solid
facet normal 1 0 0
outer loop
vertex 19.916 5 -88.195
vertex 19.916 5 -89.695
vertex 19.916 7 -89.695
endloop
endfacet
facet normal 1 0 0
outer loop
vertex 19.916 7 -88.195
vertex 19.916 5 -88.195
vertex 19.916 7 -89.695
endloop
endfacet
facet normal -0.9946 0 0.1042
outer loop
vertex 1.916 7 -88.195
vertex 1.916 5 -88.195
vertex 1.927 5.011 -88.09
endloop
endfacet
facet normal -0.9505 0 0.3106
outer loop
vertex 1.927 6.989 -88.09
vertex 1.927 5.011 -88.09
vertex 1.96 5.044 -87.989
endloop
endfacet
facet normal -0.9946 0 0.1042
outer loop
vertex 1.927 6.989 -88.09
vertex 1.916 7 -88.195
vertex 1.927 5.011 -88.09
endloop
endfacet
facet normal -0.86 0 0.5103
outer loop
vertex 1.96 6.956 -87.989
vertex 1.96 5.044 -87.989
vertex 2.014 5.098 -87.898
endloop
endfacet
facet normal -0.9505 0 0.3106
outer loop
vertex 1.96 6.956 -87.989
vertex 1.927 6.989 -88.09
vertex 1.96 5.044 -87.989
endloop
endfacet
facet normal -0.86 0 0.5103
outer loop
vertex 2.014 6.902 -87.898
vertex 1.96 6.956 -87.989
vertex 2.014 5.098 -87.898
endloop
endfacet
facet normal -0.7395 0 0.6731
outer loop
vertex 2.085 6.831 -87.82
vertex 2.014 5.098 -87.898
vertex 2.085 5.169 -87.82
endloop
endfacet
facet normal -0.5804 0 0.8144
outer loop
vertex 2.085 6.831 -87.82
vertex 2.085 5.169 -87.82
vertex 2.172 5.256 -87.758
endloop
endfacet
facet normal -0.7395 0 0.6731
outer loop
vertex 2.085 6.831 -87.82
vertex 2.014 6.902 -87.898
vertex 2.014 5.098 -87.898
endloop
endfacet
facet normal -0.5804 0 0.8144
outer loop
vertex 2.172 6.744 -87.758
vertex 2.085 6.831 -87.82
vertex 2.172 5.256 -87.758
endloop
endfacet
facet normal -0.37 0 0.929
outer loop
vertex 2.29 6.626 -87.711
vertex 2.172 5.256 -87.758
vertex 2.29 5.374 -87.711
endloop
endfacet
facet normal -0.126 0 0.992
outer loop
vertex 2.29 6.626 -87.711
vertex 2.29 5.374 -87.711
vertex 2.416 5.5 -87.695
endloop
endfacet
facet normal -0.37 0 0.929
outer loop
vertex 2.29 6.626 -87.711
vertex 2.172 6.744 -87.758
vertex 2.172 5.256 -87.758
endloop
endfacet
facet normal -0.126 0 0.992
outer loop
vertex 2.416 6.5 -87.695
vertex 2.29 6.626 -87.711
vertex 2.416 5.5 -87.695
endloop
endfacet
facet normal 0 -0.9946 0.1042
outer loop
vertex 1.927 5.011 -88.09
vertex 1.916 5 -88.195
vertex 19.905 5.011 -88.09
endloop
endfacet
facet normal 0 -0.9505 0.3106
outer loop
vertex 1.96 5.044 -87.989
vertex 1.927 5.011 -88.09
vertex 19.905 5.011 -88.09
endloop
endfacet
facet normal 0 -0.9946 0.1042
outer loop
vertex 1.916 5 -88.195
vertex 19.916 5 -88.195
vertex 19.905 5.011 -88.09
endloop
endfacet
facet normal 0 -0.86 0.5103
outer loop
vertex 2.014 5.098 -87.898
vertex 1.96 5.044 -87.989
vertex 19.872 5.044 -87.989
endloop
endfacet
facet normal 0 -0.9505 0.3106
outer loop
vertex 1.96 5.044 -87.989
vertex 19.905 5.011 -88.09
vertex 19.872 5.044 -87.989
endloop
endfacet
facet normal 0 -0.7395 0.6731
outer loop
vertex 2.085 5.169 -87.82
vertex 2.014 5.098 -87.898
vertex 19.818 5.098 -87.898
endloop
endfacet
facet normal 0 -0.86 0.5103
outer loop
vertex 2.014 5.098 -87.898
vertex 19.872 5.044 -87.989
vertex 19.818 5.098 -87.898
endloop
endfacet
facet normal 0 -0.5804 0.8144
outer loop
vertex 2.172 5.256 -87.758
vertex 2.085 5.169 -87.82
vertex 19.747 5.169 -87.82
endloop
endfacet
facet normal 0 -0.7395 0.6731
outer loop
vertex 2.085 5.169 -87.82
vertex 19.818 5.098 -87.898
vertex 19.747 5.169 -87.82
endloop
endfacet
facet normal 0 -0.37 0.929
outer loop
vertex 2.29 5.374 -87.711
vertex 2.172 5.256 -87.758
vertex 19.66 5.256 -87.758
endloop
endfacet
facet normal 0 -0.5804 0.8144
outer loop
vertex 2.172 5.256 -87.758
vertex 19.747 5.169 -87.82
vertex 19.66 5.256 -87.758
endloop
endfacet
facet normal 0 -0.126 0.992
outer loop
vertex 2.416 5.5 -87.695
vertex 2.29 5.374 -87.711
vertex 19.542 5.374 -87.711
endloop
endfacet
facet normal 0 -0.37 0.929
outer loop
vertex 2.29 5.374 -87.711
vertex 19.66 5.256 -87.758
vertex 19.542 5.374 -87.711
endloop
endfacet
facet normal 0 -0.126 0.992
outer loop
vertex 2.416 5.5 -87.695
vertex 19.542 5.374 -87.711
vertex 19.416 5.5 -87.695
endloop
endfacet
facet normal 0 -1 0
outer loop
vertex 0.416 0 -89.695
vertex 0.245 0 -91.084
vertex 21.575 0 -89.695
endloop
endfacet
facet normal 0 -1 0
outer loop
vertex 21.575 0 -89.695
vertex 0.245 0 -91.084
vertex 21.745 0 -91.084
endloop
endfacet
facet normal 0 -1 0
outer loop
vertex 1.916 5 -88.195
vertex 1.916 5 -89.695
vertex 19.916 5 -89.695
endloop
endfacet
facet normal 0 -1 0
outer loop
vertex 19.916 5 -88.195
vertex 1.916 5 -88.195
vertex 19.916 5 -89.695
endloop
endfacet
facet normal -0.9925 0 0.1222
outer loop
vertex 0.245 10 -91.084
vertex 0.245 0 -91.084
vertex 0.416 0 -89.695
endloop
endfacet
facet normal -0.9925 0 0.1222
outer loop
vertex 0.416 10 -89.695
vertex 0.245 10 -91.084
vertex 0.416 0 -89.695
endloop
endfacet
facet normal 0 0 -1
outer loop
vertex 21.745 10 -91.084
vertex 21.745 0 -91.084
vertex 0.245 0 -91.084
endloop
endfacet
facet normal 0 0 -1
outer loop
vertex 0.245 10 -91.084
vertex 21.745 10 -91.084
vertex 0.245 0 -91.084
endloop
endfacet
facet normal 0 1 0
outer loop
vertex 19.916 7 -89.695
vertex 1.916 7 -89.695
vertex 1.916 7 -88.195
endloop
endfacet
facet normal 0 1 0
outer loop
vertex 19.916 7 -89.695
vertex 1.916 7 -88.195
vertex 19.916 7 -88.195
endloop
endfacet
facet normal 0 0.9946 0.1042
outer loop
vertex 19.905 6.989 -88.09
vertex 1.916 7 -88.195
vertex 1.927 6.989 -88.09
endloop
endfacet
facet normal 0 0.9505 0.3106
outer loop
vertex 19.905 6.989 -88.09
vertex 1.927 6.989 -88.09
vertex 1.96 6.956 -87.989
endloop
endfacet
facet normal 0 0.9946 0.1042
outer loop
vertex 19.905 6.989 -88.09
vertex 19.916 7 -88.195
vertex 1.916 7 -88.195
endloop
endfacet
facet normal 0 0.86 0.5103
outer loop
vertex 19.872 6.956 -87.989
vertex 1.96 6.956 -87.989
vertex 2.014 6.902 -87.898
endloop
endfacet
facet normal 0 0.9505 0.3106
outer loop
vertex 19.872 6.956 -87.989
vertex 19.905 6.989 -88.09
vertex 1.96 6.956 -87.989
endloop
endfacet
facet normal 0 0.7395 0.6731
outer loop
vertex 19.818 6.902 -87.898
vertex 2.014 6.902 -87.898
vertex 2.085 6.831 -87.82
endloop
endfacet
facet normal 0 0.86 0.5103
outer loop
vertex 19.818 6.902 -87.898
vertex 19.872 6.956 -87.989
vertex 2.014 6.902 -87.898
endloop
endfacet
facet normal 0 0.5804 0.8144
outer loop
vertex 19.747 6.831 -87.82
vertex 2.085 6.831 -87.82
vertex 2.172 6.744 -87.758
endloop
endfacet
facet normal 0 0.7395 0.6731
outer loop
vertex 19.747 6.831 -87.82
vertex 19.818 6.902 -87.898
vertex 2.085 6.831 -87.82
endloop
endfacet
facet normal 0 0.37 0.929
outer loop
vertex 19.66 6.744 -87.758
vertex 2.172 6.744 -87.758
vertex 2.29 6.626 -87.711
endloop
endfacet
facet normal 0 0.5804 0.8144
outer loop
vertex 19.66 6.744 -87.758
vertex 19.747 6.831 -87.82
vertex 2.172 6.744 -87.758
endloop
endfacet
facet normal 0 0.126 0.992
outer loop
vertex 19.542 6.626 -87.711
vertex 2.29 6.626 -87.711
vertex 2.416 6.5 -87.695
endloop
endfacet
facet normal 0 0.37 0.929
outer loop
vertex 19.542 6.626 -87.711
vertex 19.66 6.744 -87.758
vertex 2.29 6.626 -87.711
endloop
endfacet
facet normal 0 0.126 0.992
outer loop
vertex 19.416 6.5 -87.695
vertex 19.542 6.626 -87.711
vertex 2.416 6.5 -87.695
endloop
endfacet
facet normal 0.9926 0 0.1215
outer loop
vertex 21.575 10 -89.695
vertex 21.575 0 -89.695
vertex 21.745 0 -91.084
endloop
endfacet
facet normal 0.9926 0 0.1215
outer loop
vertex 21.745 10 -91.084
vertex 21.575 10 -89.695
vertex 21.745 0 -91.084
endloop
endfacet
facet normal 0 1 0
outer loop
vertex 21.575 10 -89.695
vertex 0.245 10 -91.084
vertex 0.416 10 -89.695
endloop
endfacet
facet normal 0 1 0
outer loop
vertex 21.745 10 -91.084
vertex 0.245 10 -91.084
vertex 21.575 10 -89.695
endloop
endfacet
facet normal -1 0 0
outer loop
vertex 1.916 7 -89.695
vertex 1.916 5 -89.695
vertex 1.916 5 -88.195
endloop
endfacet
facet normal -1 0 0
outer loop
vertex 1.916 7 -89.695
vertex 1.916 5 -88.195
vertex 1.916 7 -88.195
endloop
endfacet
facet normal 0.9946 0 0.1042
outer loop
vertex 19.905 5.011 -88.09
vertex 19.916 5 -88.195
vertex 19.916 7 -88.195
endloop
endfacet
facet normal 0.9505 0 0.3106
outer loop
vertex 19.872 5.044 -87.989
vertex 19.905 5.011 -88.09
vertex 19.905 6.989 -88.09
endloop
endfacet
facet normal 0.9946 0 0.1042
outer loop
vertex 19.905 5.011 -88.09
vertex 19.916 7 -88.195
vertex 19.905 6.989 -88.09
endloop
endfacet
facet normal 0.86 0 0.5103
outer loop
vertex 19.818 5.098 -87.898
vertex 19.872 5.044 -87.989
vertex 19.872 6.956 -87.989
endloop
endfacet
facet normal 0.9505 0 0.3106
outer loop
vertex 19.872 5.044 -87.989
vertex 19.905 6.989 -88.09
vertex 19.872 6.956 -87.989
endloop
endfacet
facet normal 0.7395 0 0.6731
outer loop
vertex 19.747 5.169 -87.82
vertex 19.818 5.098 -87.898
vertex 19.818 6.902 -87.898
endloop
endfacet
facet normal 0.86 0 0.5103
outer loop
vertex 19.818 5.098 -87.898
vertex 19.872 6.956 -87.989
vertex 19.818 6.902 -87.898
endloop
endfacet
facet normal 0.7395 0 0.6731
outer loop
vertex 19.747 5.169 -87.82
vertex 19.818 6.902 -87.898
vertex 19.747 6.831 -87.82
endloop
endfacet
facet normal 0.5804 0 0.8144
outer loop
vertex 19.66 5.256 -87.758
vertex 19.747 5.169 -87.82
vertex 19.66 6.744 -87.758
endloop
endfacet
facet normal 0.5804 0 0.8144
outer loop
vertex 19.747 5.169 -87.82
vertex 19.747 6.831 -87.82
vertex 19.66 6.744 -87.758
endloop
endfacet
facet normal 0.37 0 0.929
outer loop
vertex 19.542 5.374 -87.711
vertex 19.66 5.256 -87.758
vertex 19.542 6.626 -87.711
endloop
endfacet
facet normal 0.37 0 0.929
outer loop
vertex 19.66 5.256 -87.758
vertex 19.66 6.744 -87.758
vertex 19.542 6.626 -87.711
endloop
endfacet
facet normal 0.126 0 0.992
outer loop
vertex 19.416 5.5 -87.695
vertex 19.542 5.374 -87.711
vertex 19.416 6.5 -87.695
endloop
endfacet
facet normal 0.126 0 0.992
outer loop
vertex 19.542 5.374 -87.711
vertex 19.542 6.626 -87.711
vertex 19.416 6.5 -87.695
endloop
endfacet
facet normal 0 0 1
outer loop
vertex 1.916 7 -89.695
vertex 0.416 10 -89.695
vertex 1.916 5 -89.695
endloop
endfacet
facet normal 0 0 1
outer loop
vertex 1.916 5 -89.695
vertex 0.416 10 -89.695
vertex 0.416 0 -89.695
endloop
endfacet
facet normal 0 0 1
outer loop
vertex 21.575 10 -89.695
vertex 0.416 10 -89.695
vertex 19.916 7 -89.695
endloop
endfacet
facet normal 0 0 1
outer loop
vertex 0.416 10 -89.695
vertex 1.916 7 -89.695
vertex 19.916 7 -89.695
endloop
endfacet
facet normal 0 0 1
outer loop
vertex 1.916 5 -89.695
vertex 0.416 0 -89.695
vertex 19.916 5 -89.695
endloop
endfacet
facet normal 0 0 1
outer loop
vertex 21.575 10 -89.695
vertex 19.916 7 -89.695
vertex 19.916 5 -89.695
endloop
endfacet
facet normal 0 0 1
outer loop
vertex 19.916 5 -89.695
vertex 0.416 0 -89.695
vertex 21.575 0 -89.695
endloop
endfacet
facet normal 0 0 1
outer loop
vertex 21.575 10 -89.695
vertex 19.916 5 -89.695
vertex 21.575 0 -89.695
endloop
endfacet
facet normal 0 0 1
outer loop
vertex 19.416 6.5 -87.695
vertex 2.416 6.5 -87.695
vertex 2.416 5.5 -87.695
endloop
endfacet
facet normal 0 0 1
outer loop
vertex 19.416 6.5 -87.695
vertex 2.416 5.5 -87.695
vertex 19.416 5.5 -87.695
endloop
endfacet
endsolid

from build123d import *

# Parameters (mm, degrees)
RESSALTO_EXTRUS_O1_DEPTH = 10
ESBO_O4_W                = 18
ESBO_O4_H                = 2
RESSALTO_EXTRUS_O2_DEPTH = 2
FILETE1_R                = 0.5


with BuildPart() as part:
    # Esboço3 → Ressalto-extrusão1 (new body)
    with BuildSketch(Plane(origin=(0, 0, 0), x_dir=(1, 0, 0), z_dir=(0, 1, 0))):
        Polygon((21.574658441, 89.694736978), (21.745275522, 91.08430159), (0.245275522, 91.08430159), (0.415892603, 89.694736978), align=None)
    extrude(amount=RESSALTO_EXTRUS_O1_DEPTH)

    # Esboço4 → Ressalto-extrusão2 (add)
    with BuildSketch(Plane.XY.offset(-89.694736978)):
        with Locations((10.915892603, 6)):
            Rectangle(ESBO_O4_W, ESBO_O4_H)
    extrude(amount=RESSALTO_EXTRUS_O2_DEPTH)

    # Filete1
    filete1_edges = [part.edges().sort_by_distance(p)[0] for p in [
        (1.915892603, 6, -87.694736978),
        (10.915892603, 5, -87.694736978),
        (19.915892603, 6, -87.694736978),
        (10.915892603, 7, -87.694736978),
    ]]
    fillet(filete1_edges, radius=FILETE1_R)


solid = part.part
